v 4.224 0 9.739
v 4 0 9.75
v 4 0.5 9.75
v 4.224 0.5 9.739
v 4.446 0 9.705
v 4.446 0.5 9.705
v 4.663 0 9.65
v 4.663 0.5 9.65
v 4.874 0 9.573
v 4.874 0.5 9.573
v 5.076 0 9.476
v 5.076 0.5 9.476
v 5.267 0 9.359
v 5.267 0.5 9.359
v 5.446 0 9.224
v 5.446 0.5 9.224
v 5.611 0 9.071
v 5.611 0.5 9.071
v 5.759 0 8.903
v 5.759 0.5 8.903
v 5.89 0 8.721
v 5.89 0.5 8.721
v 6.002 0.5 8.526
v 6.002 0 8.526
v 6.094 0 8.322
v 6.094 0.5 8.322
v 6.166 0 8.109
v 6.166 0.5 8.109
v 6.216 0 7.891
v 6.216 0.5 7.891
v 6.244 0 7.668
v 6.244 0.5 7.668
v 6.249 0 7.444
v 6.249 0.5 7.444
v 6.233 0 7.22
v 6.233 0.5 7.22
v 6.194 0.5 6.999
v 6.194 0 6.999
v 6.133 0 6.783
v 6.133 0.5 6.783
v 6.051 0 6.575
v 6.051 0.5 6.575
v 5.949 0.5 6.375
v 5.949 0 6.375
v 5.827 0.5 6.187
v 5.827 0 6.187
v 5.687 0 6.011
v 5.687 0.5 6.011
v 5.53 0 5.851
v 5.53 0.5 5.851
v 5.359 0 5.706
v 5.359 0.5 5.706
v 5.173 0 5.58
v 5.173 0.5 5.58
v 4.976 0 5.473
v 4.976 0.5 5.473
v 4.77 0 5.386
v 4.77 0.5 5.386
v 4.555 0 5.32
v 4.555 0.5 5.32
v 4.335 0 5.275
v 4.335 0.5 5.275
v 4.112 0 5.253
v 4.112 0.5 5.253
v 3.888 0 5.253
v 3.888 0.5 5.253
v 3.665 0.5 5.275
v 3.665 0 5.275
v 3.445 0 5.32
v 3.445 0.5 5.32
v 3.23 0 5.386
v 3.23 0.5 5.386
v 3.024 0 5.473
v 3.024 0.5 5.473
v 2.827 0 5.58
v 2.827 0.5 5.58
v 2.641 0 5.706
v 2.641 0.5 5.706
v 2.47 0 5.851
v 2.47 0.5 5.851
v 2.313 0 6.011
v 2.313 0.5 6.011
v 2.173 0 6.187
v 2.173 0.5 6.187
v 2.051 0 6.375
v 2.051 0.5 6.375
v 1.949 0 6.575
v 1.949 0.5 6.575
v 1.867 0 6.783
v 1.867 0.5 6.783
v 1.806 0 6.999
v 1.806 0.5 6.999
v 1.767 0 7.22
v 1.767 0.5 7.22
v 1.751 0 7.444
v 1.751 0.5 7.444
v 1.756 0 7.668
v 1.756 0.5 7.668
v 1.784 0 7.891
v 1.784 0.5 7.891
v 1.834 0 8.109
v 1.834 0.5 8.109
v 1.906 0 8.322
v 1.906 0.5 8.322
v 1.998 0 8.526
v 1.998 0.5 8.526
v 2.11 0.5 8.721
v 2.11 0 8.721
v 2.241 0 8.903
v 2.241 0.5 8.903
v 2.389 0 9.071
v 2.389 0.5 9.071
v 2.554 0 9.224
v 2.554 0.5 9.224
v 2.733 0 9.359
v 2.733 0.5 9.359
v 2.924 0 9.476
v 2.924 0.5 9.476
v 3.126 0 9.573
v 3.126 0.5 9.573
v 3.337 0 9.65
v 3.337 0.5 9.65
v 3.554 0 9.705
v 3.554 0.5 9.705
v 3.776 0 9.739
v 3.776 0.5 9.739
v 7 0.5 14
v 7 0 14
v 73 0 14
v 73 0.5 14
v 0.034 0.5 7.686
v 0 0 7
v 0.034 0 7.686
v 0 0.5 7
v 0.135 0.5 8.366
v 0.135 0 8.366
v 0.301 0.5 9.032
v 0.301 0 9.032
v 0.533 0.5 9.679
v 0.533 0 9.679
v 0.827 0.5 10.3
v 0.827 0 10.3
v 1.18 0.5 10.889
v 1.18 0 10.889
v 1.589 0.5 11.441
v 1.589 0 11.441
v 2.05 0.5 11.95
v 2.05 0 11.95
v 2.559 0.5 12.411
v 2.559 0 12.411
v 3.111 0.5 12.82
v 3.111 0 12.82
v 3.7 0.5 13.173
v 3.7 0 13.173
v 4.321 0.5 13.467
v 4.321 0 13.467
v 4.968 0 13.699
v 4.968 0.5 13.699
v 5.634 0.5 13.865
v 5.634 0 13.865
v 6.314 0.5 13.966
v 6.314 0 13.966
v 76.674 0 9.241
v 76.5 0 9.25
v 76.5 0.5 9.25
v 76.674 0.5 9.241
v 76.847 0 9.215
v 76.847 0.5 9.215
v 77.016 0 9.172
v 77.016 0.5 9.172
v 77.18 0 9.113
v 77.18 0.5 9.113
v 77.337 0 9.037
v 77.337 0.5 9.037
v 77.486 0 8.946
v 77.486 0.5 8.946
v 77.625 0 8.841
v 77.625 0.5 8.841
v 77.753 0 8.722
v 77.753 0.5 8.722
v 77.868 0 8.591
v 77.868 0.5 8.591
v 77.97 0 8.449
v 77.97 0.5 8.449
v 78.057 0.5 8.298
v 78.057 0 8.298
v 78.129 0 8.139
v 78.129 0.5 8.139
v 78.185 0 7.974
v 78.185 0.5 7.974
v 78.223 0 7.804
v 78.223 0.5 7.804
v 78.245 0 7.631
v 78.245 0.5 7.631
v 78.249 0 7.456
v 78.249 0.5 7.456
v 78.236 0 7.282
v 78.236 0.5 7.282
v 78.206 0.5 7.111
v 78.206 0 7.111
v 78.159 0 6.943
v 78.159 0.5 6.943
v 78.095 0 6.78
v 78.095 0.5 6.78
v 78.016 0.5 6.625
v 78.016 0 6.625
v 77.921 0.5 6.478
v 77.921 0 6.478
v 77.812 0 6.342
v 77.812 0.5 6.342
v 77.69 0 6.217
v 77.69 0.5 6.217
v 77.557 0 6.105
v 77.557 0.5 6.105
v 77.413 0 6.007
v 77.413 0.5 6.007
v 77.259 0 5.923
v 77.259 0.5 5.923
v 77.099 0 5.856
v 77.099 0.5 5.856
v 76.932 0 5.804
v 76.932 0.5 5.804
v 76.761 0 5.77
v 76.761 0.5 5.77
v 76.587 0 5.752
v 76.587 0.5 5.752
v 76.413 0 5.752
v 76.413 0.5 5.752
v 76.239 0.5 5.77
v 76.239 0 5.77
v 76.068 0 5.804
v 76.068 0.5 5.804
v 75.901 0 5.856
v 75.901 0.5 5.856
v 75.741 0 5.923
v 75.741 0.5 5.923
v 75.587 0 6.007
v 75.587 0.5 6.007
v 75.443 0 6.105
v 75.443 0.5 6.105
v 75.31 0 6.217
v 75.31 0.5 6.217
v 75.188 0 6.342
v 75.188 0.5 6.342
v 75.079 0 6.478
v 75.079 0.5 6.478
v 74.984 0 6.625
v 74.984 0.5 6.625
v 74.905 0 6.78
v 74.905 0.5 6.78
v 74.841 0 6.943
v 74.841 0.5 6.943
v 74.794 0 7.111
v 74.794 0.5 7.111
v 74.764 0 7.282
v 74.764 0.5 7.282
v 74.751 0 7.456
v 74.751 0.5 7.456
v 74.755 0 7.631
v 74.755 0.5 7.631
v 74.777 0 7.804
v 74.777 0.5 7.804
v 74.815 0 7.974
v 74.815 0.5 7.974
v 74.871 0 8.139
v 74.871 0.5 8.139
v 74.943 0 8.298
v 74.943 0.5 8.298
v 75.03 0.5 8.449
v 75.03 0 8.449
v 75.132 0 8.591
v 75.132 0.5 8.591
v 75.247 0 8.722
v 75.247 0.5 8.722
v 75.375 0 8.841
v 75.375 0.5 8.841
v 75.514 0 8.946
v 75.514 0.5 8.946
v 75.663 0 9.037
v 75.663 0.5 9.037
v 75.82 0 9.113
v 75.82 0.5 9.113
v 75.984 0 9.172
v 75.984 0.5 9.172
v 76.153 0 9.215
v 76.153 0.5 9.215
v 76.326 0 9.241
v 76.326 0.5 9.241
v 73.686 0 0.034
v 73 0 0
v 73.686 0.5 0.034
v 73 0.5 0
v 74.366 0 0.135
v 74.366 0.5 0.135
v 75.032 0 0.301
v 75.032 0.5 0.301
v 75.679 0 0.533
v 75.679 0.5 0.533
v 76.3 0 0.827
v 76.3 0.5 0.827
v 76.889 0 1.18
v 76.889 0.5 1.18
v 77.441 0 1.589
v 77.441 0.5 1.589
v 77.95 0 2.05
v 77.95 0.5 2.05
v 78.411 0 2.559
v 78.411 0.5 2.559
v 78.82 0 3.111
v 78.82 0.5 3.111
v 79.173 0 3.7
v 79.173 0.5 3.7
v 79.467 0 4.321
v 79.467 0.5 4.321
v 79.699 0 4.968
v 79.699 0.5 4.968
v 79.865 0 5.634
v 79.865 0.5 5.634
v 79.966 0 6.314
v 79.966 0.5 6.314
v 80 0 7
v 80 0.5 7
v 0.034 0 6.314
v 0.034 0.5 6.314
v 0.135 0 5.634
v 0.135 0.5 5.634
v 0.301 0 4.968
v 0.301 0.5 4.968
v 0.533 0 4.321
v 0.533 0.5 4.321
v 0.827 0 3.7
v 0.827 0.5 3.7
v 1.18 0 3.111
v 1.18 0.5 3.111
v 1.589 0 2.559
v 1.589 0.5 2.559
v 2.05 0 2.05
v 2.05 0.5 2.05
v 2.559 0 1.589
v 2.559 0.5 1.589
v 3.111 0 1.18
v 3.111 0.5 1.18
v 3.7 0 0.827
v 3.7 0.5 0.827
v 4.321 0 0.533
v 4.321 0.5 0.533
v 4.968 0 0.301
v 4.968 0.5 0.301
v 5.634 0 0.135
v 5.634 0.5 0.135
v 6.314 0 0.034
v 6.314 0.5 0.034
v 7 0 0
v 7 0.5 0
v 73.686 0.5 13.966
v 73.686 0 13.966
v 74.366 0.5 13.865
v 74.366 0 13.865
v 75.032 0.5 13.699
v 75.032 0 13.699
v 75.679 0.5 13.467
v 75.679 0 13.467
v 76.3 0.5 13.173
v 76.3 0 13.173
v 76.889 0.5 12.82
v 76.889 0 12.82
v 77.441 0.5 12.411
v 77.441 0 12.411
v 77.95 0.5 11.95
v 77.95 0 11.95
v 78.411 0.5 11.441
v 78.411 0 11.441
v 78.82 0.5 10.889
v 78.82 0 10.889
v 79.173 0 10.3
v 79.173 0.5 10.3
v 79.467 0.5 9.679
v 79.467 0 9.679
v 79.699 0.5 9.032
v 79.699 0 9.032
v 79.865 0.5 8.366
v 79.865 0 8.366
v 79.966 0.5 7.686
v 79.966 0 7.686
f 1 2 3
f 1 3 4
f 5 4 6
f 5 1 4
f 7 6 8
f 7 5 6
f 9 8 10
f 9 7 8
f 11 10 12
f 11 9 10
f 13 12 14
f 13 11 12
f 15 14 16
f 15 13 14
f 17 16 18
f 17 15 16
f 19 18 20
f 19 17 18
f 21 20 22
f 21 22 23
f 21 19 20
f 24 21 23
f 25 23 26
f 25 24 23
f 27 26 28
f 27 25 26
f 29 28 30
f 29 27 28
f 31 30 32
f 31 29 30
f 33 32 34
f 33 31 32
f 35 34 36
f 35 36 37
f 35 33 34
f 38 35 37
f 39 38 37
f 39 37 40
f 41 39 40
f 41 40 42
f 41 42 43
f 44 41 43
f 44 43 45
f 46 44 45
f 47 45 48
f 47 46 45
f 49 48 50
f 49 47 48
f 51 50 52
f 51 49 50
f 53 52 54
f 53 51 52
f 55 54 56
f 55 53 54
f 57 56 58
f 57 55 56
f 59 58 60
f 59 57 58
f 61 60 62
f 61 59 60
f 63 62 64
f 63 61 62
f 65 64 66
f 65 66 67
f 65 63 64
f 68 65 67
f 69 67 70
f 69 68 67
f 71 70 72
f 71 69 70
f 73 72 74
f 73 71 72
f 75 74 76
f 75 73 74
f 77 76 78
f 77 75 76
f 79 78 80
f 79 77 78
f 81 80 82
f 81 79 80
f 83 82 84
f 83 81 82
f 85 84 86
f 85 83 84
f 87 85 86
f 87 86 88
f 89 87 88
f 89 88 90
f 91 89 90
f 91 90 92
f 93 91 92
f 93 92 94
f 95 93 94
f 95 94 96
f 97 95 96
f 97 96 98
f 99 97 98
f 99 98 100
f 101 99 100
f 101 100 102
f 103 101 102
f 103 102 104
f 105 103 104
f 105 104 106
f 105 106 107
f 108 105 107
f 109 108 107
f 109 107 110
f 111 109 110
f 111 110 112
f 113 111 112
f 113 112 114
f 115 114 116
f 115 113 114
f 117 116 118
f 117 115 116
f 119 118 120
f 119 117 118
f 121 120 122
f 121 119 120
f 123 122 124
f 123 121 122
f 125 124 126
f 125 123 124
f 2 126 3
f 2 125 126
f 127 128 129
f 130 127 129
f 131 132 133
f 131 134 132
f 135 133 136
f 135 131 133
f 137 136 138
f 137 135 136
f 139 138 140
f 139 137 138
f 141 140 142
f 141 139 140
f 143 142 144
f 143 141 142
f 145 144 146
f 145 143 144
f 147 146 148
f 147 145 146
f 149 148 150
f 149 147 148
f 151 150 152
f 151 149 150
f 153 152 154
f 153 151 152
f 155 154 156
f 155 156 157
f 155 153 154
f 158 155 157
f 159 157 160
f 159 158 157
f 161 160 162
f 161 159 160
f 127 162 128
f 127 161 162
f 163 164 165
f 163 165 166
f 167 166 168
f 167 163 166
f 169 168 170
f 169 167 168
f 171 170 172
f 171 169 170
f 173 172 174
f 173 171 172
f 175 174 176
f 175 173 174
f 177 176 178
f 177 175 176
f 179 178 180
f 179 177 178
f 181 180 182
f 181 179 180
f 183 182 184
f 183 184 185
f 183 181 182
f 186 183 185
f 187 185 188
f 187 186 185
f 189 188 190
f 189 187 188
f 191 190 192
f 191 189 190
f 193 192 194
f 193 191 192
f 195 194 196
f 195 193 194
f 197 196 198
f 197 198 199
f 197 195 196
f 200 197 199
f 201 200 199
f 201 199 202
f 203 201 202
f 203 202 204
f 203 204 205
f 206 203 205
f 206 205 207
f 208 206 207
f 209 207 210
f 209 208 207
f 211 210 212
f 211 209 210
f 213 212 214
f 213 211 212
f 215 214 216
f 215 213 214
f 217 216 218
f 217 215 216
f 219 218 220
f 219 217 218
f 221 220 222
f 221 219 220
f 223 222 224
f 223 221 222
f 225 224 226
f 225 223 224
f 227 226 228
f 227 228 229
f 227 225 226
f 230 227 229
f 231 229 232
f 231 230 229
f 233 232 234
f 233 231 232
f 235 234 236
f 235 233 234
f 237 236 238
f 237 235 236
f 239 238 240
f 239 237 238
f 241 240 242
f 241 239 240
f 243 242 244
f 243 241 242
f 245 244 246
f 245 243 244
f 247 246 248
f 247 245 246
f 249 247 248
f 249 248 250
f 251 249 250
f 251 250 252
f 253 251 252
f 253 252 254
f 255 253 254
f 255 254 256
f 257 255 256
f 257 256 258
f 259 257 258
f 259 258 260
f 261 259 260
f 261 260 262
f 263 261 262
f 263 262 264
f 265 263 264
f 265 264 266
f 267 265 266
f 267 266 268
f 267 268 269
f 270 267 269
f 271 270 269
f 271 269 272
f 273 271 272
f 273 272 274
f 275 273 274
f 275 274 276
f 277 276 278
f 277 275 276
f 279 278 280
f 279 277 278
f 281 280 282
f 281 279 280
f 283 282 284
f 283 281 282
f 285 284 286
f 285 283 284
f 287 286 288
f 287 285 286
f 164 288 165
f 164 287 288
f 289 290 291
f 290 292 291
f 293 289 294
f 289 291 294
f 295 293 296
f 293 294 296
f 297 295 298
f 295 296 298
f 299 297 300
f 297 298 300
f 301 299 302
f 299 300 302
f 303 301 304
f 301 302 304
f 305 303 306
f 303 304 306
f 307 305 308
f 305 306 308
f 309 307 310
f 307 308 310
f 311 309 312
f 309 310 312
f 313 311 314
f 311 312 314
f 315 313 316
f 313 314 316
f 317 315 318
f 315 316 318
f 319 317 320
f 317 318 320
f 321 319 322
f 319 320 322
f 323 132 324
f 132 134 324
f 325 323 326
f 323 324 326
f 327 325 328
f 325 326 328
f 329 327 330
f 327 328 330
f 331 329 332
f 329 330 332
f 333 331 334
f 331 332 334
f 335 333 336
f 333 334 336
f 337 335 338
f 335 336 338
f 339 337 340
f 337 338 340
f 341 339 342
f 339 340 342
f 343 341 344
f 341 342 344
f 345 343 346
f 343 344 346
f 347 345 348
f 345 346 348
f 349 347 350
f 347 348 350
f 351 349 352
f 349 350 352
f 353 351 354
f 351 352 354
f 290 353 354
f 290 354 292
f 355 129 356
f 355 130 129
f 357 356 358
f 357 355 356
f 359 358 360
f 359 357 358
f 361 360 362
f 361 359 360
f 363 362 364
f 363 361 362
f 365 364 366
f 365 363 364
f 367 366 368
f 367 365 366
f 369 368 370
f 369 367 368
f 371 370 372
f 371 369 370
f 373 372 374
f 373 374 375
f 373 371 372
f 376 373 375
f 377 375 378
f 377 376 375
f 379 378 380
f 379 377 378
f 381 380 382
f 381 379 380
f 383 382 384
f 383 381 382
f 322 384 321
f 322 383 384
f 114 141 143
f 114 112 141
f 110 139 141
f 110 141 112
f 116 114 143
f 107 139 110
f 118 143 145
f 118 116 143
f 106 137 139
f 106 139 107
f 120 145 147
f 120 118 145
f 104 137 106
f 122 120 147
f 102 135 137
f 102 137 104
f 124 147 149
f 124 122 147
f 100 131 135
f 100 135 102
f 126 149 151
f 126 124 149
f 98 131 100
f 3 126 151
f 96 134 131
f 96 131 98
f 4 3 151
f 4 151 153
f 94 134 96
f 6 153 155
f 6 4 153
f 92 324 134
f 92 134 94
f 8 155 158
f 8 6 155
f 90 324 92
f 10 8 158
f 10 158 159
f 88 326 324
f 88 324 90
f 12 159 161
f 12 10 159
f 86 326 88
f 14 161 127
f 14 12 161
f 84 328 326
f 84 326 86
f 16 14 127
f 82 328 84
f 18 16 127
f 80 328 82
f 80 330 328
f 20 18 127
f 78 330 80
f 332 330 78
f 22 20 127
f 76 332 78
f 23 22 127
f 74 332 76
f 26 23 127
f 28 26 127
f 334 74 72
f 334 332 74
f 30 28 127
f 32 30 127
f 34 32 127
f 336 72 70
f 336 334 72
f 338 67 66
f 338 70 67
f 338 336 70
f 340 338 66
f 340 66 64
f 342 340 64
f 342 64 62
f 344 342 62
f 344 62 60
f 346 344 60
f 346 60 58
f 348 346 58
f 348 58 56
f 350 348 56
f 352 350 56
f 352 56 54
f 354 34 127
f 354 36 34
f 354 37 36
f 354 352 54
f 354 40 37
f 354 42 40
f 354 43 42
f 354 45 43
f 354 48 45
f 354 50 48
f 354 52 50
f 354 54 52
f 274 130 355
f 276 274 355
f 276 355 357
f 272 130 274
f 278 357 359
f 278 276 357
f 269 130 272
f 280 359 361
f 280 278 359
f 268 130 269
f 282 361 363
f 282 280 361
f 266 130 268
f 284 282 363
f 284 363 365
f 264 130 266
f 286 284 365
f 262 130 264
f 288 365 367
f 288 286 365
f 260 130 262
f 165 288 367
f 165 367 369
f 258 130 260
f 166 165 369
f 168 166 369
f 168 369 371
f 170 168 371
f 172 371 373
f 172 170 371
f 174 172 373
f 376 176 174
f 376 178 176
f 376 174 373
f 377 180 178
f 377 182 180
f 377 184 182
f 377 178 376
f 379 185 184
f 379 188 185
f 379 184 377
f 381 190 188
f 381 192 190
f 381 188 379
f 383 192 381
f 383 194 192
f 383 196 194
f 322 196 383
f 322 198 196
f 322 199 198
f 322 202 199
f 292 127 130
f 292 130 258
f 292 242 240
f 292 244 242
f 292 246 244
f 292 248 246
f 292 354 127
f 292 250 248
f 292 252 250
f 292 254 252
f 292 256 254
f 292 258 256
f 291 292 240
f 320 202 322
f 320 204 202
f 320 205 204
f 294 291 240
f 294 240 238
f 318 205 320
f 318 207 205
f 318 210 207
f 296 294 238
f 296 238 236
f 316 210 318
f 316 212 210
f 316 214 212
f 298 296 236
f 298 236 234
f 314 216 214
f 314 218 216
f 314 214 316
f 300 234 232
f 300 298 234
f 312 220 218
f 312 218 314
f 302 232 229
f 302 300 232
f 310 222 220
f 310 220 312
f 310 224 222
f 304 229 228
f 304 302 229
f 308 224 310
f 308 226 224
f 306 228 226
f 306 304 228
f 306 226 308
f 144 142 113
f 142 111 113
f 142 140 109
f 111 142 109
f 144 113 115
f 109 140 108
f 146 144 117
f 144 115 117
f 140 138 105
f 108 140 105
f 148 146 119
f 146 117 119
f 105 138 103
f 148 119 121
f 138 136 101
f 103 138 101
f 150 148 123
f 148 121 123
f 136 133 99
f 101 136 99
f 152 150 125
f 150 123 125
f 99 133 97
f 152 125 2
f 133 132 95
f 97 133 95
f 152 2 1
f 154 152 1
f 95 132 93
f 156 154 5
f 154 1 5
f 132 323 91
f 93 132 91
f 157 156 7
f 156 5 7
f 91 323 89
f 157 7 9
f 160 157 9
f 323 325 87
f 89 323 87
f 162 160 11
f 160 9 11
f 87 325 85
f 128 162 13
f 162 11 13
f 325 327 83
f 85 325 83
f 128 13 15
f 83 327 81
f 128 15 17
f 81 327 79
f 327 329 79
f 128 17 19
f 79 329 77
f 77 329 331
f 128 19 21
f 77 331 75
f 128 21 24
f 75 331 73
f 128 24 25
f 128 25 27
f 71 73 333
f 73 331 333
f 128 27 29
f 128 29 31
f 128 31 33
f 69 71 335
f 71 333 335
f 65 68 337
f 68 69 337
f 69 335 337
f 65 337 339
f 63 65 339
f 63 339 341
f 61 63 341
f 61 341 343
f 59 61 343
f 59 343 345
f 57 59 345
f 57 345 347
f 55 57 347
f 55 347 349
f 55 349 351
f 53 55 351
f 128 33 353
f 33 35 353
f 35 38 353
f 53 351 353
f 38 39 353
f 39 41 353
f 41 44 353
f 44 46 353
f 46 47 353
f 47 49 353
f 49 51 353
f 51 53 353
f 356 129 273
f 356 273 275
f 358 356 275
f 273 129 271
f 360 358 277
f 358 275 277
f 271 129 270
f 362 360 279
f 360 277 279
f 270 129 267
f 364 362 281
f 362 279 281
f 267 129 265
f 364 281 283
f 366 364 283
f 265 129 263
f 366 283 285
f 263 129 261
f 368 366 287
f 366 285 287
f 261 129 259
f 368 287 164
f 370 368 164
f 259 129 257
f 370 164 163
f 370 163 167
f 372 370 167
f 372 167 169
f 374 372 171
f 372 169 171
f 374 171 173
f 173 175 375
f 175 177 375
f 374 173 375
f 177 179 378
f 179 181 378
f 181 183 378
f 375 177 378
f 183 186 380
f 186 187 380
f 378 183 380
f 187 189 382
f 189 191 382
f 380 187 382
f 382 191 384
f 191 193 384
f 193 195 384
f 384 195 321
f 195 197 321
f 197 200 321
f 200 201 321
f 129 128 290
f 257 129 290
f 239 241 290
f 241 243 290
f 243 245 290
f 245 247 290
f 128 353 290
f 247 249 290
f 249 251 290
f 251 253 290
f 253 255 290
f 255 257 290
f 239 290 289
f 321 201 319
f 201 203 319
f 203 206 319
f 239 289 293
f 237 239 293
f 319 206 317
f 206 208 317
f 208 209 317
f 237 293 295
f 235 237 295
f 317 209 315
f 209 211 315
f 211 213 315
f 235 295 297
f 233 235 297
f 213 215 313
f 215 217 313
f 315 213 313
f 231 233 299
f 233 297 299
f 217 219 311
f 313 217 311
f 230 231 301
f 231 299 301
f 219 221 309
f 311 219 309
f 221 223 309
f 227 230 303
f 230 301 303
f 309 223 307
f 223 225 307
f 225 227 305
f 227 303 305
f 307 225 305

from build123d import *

# Parameters (mm, degrees)
SKETCH_1_W      = 80
SKETCH_1_H      = 14
SKETCH_1_R      = 2.25
SKETCH_1_R_2    = 1.75
EXTRUDE_1_DEPTH = 0.5
FILLET_1_R      = 7


with BuildPart() as part:
    # 草图1 → 凸台-拉伸1 (new body)
    with BuildSketch(Plane(origin=(0, 0, 0), x_dir=(1, 0, 0), z_dir=(0, 1, 0))):
        with Locations((40, -7)):
            Rectangle(SKETCH_1_W, SKETCH_1_H)
        with Locations(Location((4, -7.5, 0), (0, 0, 270))):
            Circle(SKETCH_1_R, mode=Mode.SUBTRACT)
        with Locations(Location((76.5, -7.5, 0), (0, 0, 270))):
            Circle(SKETCH_1_R_2, mode=Mode.SUBTRACT)
    extrude(amount=EXTRUDE_1_DEPTH)

    # 圆角1
    fillet_1_edges = [part.edges().sort_by_distance(p)[0] for p in [
        (0, 0.25, 0),
        (80, 0.25, 0),
        (80, 0.25, 14),
        (0, 0.25, 14),
    ]]
    fillet(fillet_1_edges, radius=FILLET_1_R - 0.0001)  # a hair under: the kernel refuses the full size


solid = part.part
